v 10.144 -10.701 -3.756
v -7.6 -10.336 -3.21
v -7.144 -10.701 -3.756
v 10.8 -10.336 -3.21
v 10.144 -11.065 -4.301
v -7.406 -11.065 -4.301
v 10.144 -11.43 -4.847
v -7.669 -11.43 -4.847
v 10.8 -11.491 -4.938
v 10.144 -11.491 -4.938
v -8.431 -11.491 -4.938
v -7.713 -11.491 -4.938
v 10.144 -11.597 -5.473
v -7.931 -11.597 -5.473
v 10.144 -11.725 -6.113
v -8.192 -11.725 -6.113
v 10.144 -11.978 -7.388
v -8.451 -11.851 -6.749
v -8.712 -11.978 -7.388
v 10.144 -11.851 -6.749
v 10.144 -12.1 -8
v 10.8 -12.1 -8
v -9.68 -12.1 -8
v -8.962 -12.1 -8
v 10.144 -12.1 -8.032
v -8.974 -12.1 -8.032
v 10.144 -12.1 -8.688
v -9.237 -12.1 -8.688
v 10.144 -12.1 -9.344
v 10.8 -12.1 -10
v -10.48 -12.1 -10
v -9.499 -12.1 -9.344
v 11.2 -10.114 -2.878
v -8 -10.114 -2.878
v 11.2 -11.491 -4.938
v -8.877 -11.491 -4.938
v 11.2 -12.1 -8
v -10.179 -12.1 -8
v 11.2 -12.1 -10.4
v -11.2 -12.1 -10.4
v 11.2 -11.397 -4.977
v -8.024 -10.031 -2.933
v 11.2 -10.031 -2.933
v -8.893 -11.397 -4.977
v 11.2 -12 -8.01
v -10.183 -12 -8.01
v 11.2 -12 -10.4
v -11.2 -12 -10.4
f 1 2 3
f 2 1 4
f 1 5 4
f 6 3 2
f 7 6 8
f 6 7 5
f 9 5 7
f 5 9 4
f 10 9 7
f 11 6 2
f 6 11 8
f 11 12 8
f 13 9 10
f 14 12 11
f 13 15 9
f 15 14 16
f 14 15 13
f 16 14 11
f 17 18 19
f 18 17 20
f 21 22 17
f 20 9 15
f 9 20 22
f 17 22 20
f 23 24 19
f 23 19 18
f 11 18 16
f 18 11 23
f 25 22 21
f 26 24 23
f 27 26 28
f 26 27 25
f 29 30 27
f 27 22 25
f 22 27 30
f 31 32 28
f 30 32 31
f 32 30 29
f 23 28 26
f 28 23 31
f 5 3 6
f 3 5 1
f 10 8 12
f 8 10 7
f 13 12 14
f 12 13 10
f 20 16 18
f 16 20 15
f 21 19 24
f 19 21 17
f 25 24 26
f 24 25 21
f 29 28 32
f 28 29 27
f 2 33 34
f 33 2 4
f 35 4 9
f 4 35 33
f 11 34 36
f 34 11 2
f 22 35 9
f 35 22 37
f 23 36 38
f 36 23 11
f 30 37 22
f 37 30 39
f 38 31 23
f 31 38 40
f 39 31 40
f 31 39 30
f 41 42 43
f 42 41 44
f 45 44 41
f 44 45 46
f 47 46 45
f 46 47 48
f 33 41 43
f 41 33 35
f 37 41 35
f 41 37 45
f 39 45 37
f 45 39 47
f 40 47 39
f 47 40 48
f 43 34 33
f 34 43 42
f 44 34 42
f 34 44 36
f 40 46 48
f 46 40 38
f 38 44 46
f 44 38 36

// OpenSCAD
// file: ../p/4-4edge.scad
use <../lib.scad>
$fa=1; $fs=0.2;
function ldraw_lib__4_4edge(realsolid=false) = [
// 0 Circle 1.0
// 0 Name: 4-4edge.dat
// 0 Author: James Jessiman
// 0 !LDRAW_ORG Primitive UPDATE 2017-01
// 0 !LICENSE Licensed under CC BY 2.0 and CC BY 4.0 : see CAreadme.txt
// 
// 0 BFC CERTIFY CCW
  [0,"BFC","CERTIFY"],
  [0,"BFC","CCW"],
// 
// 0 !HISTORY 1998-12-15 [PTadmin] Official Update 1998-10
// 0 !HISTORY 2005-12-28 [PTadmin] Official Update 2005-01
// 0 !HISTORY 2007-06-24 [PTadmin] Header formatted for Contributor Agreement
// 0 !HISTORY 2008-07-01 [PTadmin] Official Update 2008-01
// 0 !HISTORY 2017-01-15 [Steffen] BFCed
// 0 !HISTORY 2017-12-30 [PTadmin] Official Update 2017-01
// 
// 
// 2 24 1 0 0 0.9239 0 0.3827
  [2,24,1,0,0,0.9239,0,0.3827],
// 2 24 0.9239 0 0.3827 0.7071 0 0.7071
  [2,24,0.9239,0,0.3827,0.7071,0,0.7071],
// 2 24 0.7071 0 0.7071 0.3827 0 0.9239
  [2,24,0.7071,0,0.7071,0.3827,0,0.9239],
// 2 24 0.3827 0 0.9239 0 0 1
  [2,24,0.3827,0,0.9239,0,0,1],
// 2 24 0 0 1 -0.3827 0 0.9239
  [2,24,0,0,1,-0.3827,0,0.9239],
// 2 24 -0.3827 0 0.9239 -0.7071 0 0.7071
  [2,24,-0.3827,0,0.9239,-0.7071,0,0.7071],
// 2 24 -0.7071 0 0.7071 -0.9239 0 0.3827
  [2,24,-0.7071,0,0.7071,-0.9239,0,0.3827],
// 2 24 -0.9239 0 0.3827 -1 0 -0
  [2,24,-0.9239,0,0.3827,-1,0,-0],
// 2 24 -1 0 -0 -0.9239 0 -0.3827
  [2,24,-1,0,-0,-0.9239,0,-0.3827],
// 2 24 -0.9239 0 -0.3827 -0.7071 0 -0.7071
  [2,24,-0.9239,0,-0.3827,-0.7071,0,-0.7071],
// 2 24 -0.7071 0 -0.7071 -0.3827 0 -0.9239
  [2,24,-0.7071,0,-0.7071,-0.3827,0,-0.9239],
// 2 24 -0.3827 0 -0.9239 0 0 -1
  [2,24,-0.3827,0,-0.9239,0,0,-1],
// 2 24 0 0 -1 0.3827 0 -0.9239
  [2,24,0,0,-1,0.3827,0,-0.9239],
// 2 24 0.3827 0 -0.9239 0.7071 0 -0.7071
  [2,24,0.3827,0,-0.9239,0.7071,0,-0.7071],
// 2 24 0.7071 0 -0.7071 0.9239 0 -0.3827
  [2,24,0.7071,0,-0.7071,0.9239,0,-0.3827],
// 2 24 0.9239 0 -0.3827 1 0 0
  [2,24,0.9239,0,-0.3827,1,0,0],
];
module ldraw_lib__4_4edge(step=0, col=false, unit=2/5, alt=false, line=0.2, solid=!$preview)
    makepoly(ldraw_lib__4_4edge(solid), step=step, col=col, unit=unit, alt=alt, line=line, solid=solid);
ldraw_lib__4_4edge(line=0.2);
// file: ../p/4-4disc.scad
use <../lib.scad>
$fa=1; $fs=0.2;
function ldraw_lib__4_4disc(realsolid=false) = [
// 0 Disc 1.0
// 0 Name: 4-4disc.dat
// 0 Author: James Jessiman
// 0 !LDRAW_ORG Primitive UPDATE 2002-02
// 0 !LICENSE Licensed under CC BY 2.0 and CC BY 4.0 : see CAreadme.txt
// 
// 0 BFC CERTIFY CCW
  [0,"BFC","CERTIFY"],
  [0,"BFC","CCW"],
// 
// 0 !HISTORY 1998-12-15 [PTadmin] Official Update 1998-10
// 0 !HISTORY 2002-03-23 [sbliss] Added BFC statement
// 0 !HISTORY 2002-04-25 [PTadmin] Official Update 2002-02
// 0 !HISTORY 2007-06-24 [PTadmin] Header formatted for Contributor Agreement
// 0 !HISTORY 2008-07-01 [PTadmin] Official Update 2008-01
// 
// 
// 3 16 0 0 0 1 0 0 0.9239 0 0.3827
  [3,16,0,0,0,1,0,0,0.9239,0,0.3827],
// 3 16 0 0 0 0.9239 0 0.3827 0.7071 0 0.7071
  [3,16,0,0,0,0.9239,0,0.3827,0.7071,0,0.7071],
// 3 16 0 0 0 0.7071 0 0.7071 0.3827 0 0.9239
  [3,16,0,0,0,0.7071,0,0.7071,0.3827,0,0.9239],
// 3 16 0 0 0 0.3827 0 0.9239 0 0 1
  [3,16,0,0,0,0.3827,0,0.9239,0,0,1],
// 3 16 0 0 0 0 0 1 -0.3827 0 0.9239
  [3,16,0,0,0,0,0,1,-0.3827,0,0.9239],
// 3 16 0 0 0 -0.3827 0 0.9239 -0.7071 0 0.7071
  [3,16,0,0,0,-0.3827,0,0.9239,-0.7071,0,0.7071],
// 3 16 0 0 0 -0.7071 0 0.7071 -0.9239 0 0.3827
  [3,16,0,0,0,-0.7071,0,0.7071,-0.9239,0,0.3827],
// 3 16 0 0 0 -0.9239 0 0.3827 -1 0 -0
  [3,16,0,0,0,-0.9239,0,0.3827,-1,0,-0],
// 3 16 0 0 0 -1 0 -0 -0.9239 0 -0.3827
  [3,16,0,0,0,-1,0,-0,-0.9239,0,-0.3827],
// 3 16 0 0 0 -0.9239 0 -0.3827 -0.7071 0 -0.7071
  [3,16,0,0,0,-0.9239,0,-0.3827,-0.7071,0,-0.7071],
// 3 16 0 0 0 -0.7071 0 -0.7071 -0.3827 0 -0.9239
  [3,16,0,0,0,-0.7071,0,-0.7071,-0.3827,0,-0.9239],
// 3 16 0 0 0 -0.3827 0 -0.9239 0 0 -1
  [3,16,0,0,0,-0.3827,0,-0.9239,0,0,-1],
// 3 16 0 0 0 0 0 -1 0.3827 0 -0.9239
  [3,16,0,0,0,0,0,-1,0.3827,0,-0.9239],
// 3 16 0 0 0 0.3827 0 -0.9239 0.7071 0 -0.7071
  [3,16,0,0,0,0.3827,0,-0.9239,0.7071,0,-0.7071],
// 3 16 0 0 0 0.7071 0 -0.7071 0.9239 0 -0.3827
  [3,16,0,0,0,0.7071,0,-0.7071,0.9239,0,-0.3827],
// 3 16 0 0 0 0.9239 0 -0.3827 1 0 0
  [3,16,0,0,0,0.9239,0,-0.3827,1,0,0],
// 0
];
module ldraw_lib__4_4disc(step=0, col=false, unit=2/5, alt=false, line=0.2, solid=!$preview)
    makepoly(ldraw_lib__4_4disc(solid), step=step, col=col, unit=unit, alt=alt, line=line, solid=solid);
ldraw_lib__4_4disc(line=0.2);
// file: ../p/4-4cyli.scad
use <../lib.scad>
$fa=1; $fs=0.2;
function ldraw_lib__4_4cyli(realsolid=false) = [
// 0 Cylinder 1.0
// 0 Name: 4-4cyli.dat
// 0 Author: James Jessiman
// 0 !LDRAW_ORG Primitive UPDATE 2005-01
// 0 !LICENSE Licensed under CC BY 2.0 and CC BY 4.0 : see CAreadme.txt
// 
// 0 BFC CERTIFY CCW
  [0,"BFC","CERTIFY"],
  [0,"BFC","CCW"],
// 
// 0 !HISTORY 1998-12-15 [PTadmin] Official Update 1998-10
// 0 !HISTORY 2002-03-23 [sbliss] Added BFC statement; merged headers from files in distributions LDraw 0.27 and Complete.
// 0 !HISTORY 2002-04-25 [PTadmin] Official Update 2002-02
// 0 !HISTORY 2004-12-14 [guyvivan] BFC CCW
// 0 !HISTORY 2005-12-28 [PTadmin] Official Update 2005-01
// 0 !HISTORY 2007-06-24 [PTadmin] Header formatted for Contributor Agreement
// 0 !HISTORY 2008-07-01 [PTadmin] Official Update 2008-01
// 
// 
// 4 16 1 1 0 0.9239 1 0.3827 0.9239 0 0.3827 1 0 0
  [4,16,1,1,0,0.9239,1,0.3827,0.9239,0,0.3827,1,0,0],
// 5 24 1 0 0 1 1 0 0.9239 0 0.3827 0.9239 0 -0.3827
  [5,24,1,0,0,1,1,0,0.9239,0,0.3827,0.9239,0,-0.3827],
// 4 16 0.9239 1 0.3827 0.7071 1 0.7071 0.7071 0 0.7071 0.9239 0 0.3827
  [4,16,0.9239,1,0.3827,0.7071,1,0.7071,0.7071,0,0.7071,0.9239,0,0.3827],
// 5 24 0.9239 0 0.3827 0.9239 1 0.3827 0.7071 0 0.7071 1 0 0
  [5,24,0.9239,0,0.3827,0.9239,1,0.3827,0.7071,0,0.7071,1,0,0],
// 4 16 0.7071 1 0.7071 0.3827 1 0.9239 0.3827 0 0.9239 0.7071 0 0.7071
  [4,16,0.7071,1,0.7071,0.3827,1,0.9239,0.3827,0,0.9239,0.7071,0,0.7071],
// 5 24 0.7071 0 0.7071 0.7071 1 0.7071 0.3827 0 0.9239 0.9239 0 0.3827
  [5,24,0.7071,0,0.7071,0.7071,1,0.7071,0.3827,0,0.9239,0.9239,0,0.3827],
// 4 16 0.3827 1 0.9239 0 1 1 0 0 1 0.3827 0 0.9239
  [4,16,0.3827,1,0.9239,0,1,1,0,0,1,0.3827,0,0.9239],
// 5 24 0.3827 0 0.9239 0.3827 1 0.9239 0 0 1 0.7071 0 0.7071
  [5,24,0.3827,0,0.9239,0.3827,1,0.9239,0,0,1,0.7071,0,0.7071],
// 4 16 0 1 1 -0.3827 1 0.9239 -0.3827 0 0.9239 0 0 1
  [4,16,0,1,1,-0.3827,1,0.9239,-0.3827,0,0.9239,0,0,1],
// 5 24 0 0 1 0 1 1 -0.3827 0 0.9239 0.3827 0 0.9239
  [5,24,0,0,1,0,1,1,-0.3827,0,0.9239,0.3827,0,0.9239],
// 4 16 -0.3827 1 0.9239 -0.7071 1 0.7071 -0.7071 0 0.7071 -0.3827 0 0.9239
  [4,16,-0.3827,1,0.9239,-0.7071,1,0.7071,-0.7071,0,0.7071,-0.3827,0,0.9239],
// 5 24 -0.3827 0 0.9239 -0.3827 1 0.9239 -0.7071 0 0.7071 0 0 1
  [5,24,-0.3827,0,0.9239,-0.3827,1,0.9239,-0.7071,0,0.7071,0,0,1],
// 4 16 -0.7071 1 0.7071 -0.9239 1 0.3827 -0.9239 0 0.3827 -0.7071 0 0.7071
  [4,16,-0.7071,1,0.7071,-0.9239,1,0.3827,-0.9239,0,0.3827,-0.7071,0,0.7071],
// 5 24 -0.7071 0 0.7071 -0.7071 1 0.7071 -0.9239 0 0.3827 -0.3827 0 0.9239
  [5,24,-0.7071,0,0.7071,-0.7071,1,0.7071,-0.9239,0,0.3827,-0.3827,0,0.9239],
// 4 16 -0.9239 1 0.3827 -1 1 0 -1 0 0 -0.9239 0 0.3827
  [4,16,-0.9239,1,0.3827,-1,1,0,-1,0,0,-0.9239,0,0.3827],
// 5 24 -0.9239 0 0.3827 -0.9239 1 0.3827 -1 0 0 -0.7071 0 0.7071
  [5,24,-0.9239,0,0.3827,-0.9239,1,0.3827,-1,0,0,-0.7071,0,0.7071],
// 4 16 -1 1 0 -0.9239 1 -0.3827 -0.9239 0 -0.3827 -1 0 0
  [4,16,-1,1,0,-0.9239,1,-0.3827,-0.9239,0,-0.3827,-1,0,0],
// 5 24 -1 0 0 -1 1 0 -0.9239 0 -0.3827 -0.9239 0 0.3827
  [5,24,-1,0,0,-1,1,0,-0.9239,0,-0.3827,-0.9239,0,0.3827],
// 4 16 -0.9239 1 -0.3827 -0.7071 1 -0.7071 -0.7071 0 -0.7071 -0.9239 0 -0.3827
  [4,16,-0.9239,1,-0.3827,-0.7071,1,-0.7071,-0.7071,0,-0.7071,-0.9239,0,-0.3827],
// 5 24 -0.9239 0 -0.3827 -0.9239 1 -0.3827 -0.7071 0 -0.7071 -1 0 0
  [5,24,-0.9239,0,-0.3827,-0.9239,1,-0.3827,-0.7071,0,-0.7071,-1,0,0],
// 4 16 -0.7071 1 -0.7071 -0.3827 1 -0.9239 -0.3827 0 -0.9239 -0.7071 0 -0.7071
  [4,16,-0.7071,1,-0.7071,-0.3827,1,-0.9239,-0.3827,0,-0.9239,-0.7071,0,-0.7071],
// 5 24 -0.7071 0 -0.7071 -0.7071 1 -0.7071 -0.3827 0 -0.9239 -0.9239 0 -0.3827
  [5,24,-0.7071,0,-0.7071,-0.7071,1,-0.7071,-0.3827,0,-0.9239,-0.9239,0,-0.3827],
// 4 16 -0.3827 1 -0.9239 0 1 -1 0 0 -1 -0.3827 0 -0.9239
  [4,16,-0.3827,1,-0.9239,0,1,-1,0,0,-1,-0.3827,0,-0.9239],
// 5 24 -0.3827 0 -0.9239 -0.3827 1 -0.9239 0 0 -1 -0.7071 0 -0.7071
  [5,24,-0.3827,0,-0.9239,-0.3827,1,-0.9239,0,0,-1,-0.7071,0,-0.7071],
// 4 16 0 1 -1 0.3827 1 -0.9239 0.3827 0 -0.9239 0 0 -1
  [4,16,0,1,-1,0.3827,1,-0.9239,0.3827,0,-0.9239,0,0,-1],
// 5 24 0 0 -1 0 1 -1 0.3827 0 -0.9239 -0.3827 0 -0.9239
  [5,24,0,0,-1,0,1,-1,0.3827,0,-0.9239,-0.3827,0,-0.9239],
// 4 16 0.3827 1 -0.9239 0.7071 1 -0.7071 0.7071 0 -0.7071 0.3827 0 -0.9239
  [4,16,0.3827,1,-0.9239,0.7071,1,-0.7071,0.7071,0,-0.7071,0.3827,0,-0.9239],
// 5 24 0.3827 0 -0.9239 0.3827 1 -0.9239 0.7071 0 -0.7071 0 0 -1
  [5,24,0.3827,0,-0.9239,0.3827,1,-0.9239,0.7071,0,-0.7071,0,0,-1],
// 4 16 0.7071 1 -0.7071 0.9239 1 -0.3827 0.9239 0 -0.3827 0.7071 0 -0.7071
  [4,16,0.7071,1,-0.7071,0.9239,1,-0.3827,0.9239,0,-0.3827,0.7071,0,-0.7071],
// 5 24 0.7071 0 -0.7071 0.7071 1 -0.7071 0.9239 0 -0.3827 0.3827 0 -0.9239
  [5,24,0.7071,0,-0.7071,0.7071,1,-0.7071,0.9239,0,-0.3827,0.3827,0,-0.9239],
// 4 16 0.9239 1 -0.3827 1 1 0 1 0 0 0.9239 0 -0.3827
  [4,16,0.9239,1,-0.3827,1,1,0,1,0,0,0.9239,0,-0.3827],
// 5 24 0.9239 0 -0.3827 0.9239 1 -0.3827 1 0 0 0.7071 0 -0.7071
  [5,24,0.9239,0,-0.3827,0.9239,1,-0.3827,1,0,0,0.7071,0,-0.7071],
// 0
];
module ldraw_lib__4_4cyli(step=0, col=false, unit=2/5, alt=false, line=0.2, solid=!$preview)
    makepoly(ldraw_lib__4_4cyli(solid), step=step, col=col, unit=unit, alt=alt, line=line, solid=solid);
ldraw_lib__4_4cyli(line=0.2);
// file: ../p/stud3.scad
use <../lib.scad>
use <4-4cyli.scad>
use <4-4disc.scad>
use <4-4edge.scad>
$fa=1; $fs=0.2;
function ldraw_lib__stud3(realsolid=false) = realsolid ? 
    [openscad(translate([0,0,-eps()], o=cylinder(4+eps(), r=4)),2)] : [
// 0 Stud Tube Solid
// 0 Name: stud3.dat
// 0 Author: James Jessiman
// 0 !LDRAW_ORG Primitive UPDATE 2012-01
// 0 !LICENSE Licensed under CC BY 2.0 and CC BY 4.0 : see CAreadme.txt
// 
// 0 BFC CERTIFY CCW
  [0,"BFC","CERTIFY"],
  [0,"BFC","CCW"],
// 
// 0 !HISTORY 2002-04-04 [sbliss] Modified for BFC compliance
// 0 !HISTORY 2002-04-25 [PTadmin] Official Update 2002-02
// 0 !HISTORY 2007-06-24 [PTadmin] Header formatted for Contributor Agreement
// 0 !HISTORY 2008-07-01 [PTadmin] Official Update 2008-01
// 0 !HISTORY 2012-02-16 [Philo] Changed to CCW
// 0 !HISTORY 2012-03-30 [PTadmin] Official Update 2012-01
// 
// 
// 1 16 0 -4 0 4 0 0 0 1 0 0 0 4 4-4edge.dat
  [1,16,0,-4,0,4,0,0,0,1,0,0,0,4, ldraw_lib__4_4edge(realsolid)],
// 1 16 0 0 0 4 0 0 0 1 0 0 0 4 4-4edge.dat
  [1,16,0,0,0,4,0,0,0,1,0,0,0,4, ldraw_lib__4_4edge(realsolid)],
// 1 16 0 -4 0 4 0 0 0 1 0 0 0 4 4-4disc.dat
  [1,16,0,-4,0,4,0,0,0,1,0,0,0,4, ldraw_lib__4_4disc(realsolid)],
// 1 16 0 -4 0 4 0 0 0 4 0 0 0 4 4-4cyli.dat
  [1,16,0,-4,0,4,0,0,0,4,0,0,0,4, ldraw_lib__4_4cyli(realsolid)],
];
module ldraw_lib__stud3(step=0, col=false, unit=2/5, alt=false, line=0.2, solid=!$preview)
    makepoly(ldraw_lib__stud3(solid), step=step, col=col, unit=unit, alt=alt, line=line, solid=solid);
ldraw_lib__stud3(line=0.2);
// file: ../p/stud.scad
use <../lib.scad>
use <4-4cyli.scad>
use <4-4disc.scad>
use <4-4edge.scad>
$fa=1; $fs=0.2;
function ldraw_lib__stud(realsolid=false) = realsolid ? 
    [openscad(translate([0,0,-eps()], o=cylinder(4+eps(), r=6)),2)] : [
// 0 Stud
// 0 Name: stud.dat
// 0 Author: James Jessiman
// 0 !LDRAW_ORG Primitive UPDATE 2012-01
// 0 !LICENSE Licensed under CC BY 2.0 and CC BY 4.0 : see CAreadme.txt
// 
// 0 BFC CERTIFY CCW
  [0,"BFC","CERTIFY"],
  [0,"BFC","CCW"],
// 
// 0 !HISTORY 2002-04-04 [sbliss] Modified for BFC compliance
// 0 !HISTORY 2002-04-25 [PTadmin] Official Update 2002-02
// 0 !HISTORY 2007-06-24 [PTadmin] Header formatted for Contributor Agreement
// 0 !HISTORY 2008-07-01 [PTadmin] Official Update 2008-01
// 0 !HISTORY 2012-02-16 [Philo] Changed to CCW
// 0 !HISTORY 2012-03-30 [PTadmin] Official Update 2012-01
// 
// 
// 1 16 0 0 0 6 0 0 0 1 0 0 0 6 4-4edge.dat
  [1,16,0,0,0,6,0,0,0,1,0,0,0,6, ldraw_lib__4_4edge(realsolid)],
// 1 16 0 -4 0 6 0 0 0 1 0 0 0 6 4-4edge.dat
  [1,16,0,-4,0,6,0,0,0,1,0,0,0,6, ldraw_lib__4_4edge(realsolid)],
// 1 16 0 0 0 6 0 0 0 -4 0 0 0 6 4-4cyli.dat
  [1,16,0,0,0,6,0,0,0,-4,0,0,0,6, ldraw_lib__4_4cyli(realsolid)],
// 1 16 0 -4 0 6 0 0 0 1 0 0 0 6 4-4disc.dat
  [1,16,0,-4,0,6,0,0,0,1,0,0,0,6, ldraw_lib__4_4disc(realsolid)],
];
module ldraw_lib__stud(step=0, col=false, unit=2/5, alt=false, line=0.2, solid=!$preview)
    makepoly(ldraw_lib__stud(solid), step=step, col=col, unit=unit, alt=alt, line=line, solid=solid);
ldraw_lib__stud(line=0.2);
// file: ../p/box5.scad
use <../lib.scad>
$fa=1; $fs=0.2;
function ldraw_lib__box5(realsolid=false) = [
// 0 Box with 5 Faces and All Edges
// 0 Name: box5.dat
// 0 Author: James Jessiman
// 0 !LDRAW_ORG Primitive UPDATE 2012-01
// 0 !LICENSE Licensed under CC BY 2.0 and CC BY 4.0 : see CAreadme.txt
// 
// 0 BFC CERTIFY CCW
  [0,"BFC","CERTIFY"],
  [0,"BFC","CCW"],
// 
// 0 !HISTORY 2002-04-03 [sbliss] Modified for BFC compliance
// 0 !HISTORY 2002-04-25 [PTadmin] Official Update 2002-02
// 0 !HISTORY 2007-06-24 [PTadmin] Header formatted for Contributor Agreement
// 0 !HISTORY 2008-07-01 [PTadmin] Official Update 2008-01
// 0 !HISTORY 2012-02-16 [Philo] Changed to CCW
// 0 !HISTORY 2012-03-30 [PTadmin] Official Update 2012-01
// 
// 
// 2 24 1 1 1 -1 1 1
  [2,24,1,1,1,-1,1,1],
// 2 24 -1 1 1 -1 1 -1
  [2,24,-1,1,1,-1,1,-1],
// 2 24 -1 1 -1 1 1 -1
  [2,24,-1,1,-1,1,1,-1],
// 2 24 1 1 -1 1 1 1
  [2,24,1,1,-1,1,1,1],
// 2 24 1 0 1 -1 0 1
  [2,24,1,0,1,-1,0,1],
// 2 24 -1 0 1 -1 0 -1
  [2,24,-1,0,1,-1,0,-1],
// 2 24 -1 0 -1 1 0 -1
  [2,24,-1,0,-1,1,0,-1],
// 2 24 1 0 -1 1 0 1
  [2,24,1,0,-1,1,0,1],
// 2 24 1 0 1 1 1 1
  [2,24,1,0,1,1,1,1],
// 2 24 -1 0 1 -1 1 1
  [2,24,-1,0,1,-1,1,1],
// 2 24 1 0 -1 1 1 -1
  [2,24,1,0,-1,1,1,-1],
// 2 24 -1 0 -1 -1 1 -1
  [2,24,-1,0,-1,-1,1,-1],
// 4 16 -1 1 1 1 1 1 1 1 -1 -1 1 -1
  [4,16,-1,1,1,1,1,1,1,1,-1,-1,1,-1],
// 4 16 -1 1 1 -1 0 1 1 0 1 1 1 1
  [4,16,-1,1,1,-1,0,1,1,0,1,1,1,1],
// 4 16 -1 1 -1 -1 0 -1 -1 0 1 -1 1 1
  [4,16,-1,1,-1,-1,0,-1,-1,0,1,-1,1,1],
// 4 16 1 1 -1 1 0 -1 -1 0 -1 -1 1 -1
  [4,16,1,1,-1,1,0,-1,-1,0,-1,-1,1,-1],
// 4 16 1 1 1 1 0 1 1 0 -1 1 1 -1
  [4,16,1,1,1,1,0,1,1,0,-1,1,1,-1],
];
module ldraw_lib__box5(step=0, col=false, unit=2/5, alt=false, line=0.2, solid=!$preview)
    makepoly(ldraw_lib__box5(solid), step=step, col=col, unit=unit, alt=alt, line=line, solid=solid);
ldraw_lib__box5(line=0.2);
// file: ../p/box4t.scad
use <../lib.scad>
$fa=1; $fs=0.2;
function ldraw_lib__box4t(realsolid=false) = [
// 0 Box with 4 Adjacent Faces and All Edges
// 0 Name: box4t.dat
// 0 Author: Tore Eriksson [Tore_Eriksson]
// 0 !LDRAW_ORG Primitive UPDATE 2003-02
// 0 !LICENSE Licensed under CC BY 2.0 and CC BY 4.0 : see CAreadme.txt
// 
// 0 BFC CERTIFY CCW
  [0,"BFC","CERTIFY"],
  [0,"BFC","CCW"],
// 
// 0 !HISTORY 1997-09-29 [PTadmin] Official Update 1997-15
// 0 !HISTORY 2002-08-31 [izanette] Modified with WINDZ for BFC compliance
// 0 !HISTORY 2003-08-01 [PTadmin] Official Update 2003-02
// 0 !HISTORY 2007-06-24 [PTadmin] Header formatted for Contributor Agreement
// 0 !HISTORY 2008-07-01 [PTadmin] Official Update 2008-01
// 
// 
// 2 24 1 1 1 -1 1 1
  [2,24,1,1,1,-1,1,1],
// 2 24 -1 1 1 -1 1 -1
  [2,24,-1,1,1,-1,1,-1],
// 2 24 -1 1 -1 1 1 -1
  [2,24,-1,1,-1,1,1,-1],
// 2 24 1 1 -1 1 1 1
  [2,24,1,1,-1,1,1,1],
// 2 24 1 0 1 -1 0 1
  [2,24,1,0,1,-1,0,1],
// 2 24 -1 0 1 -1 0 -1
  [2,24,-1,0,1,-1,0,-1],
// 2 24 -1 0 -1 1 0 -1
  [2,24,-1,0,-1,1,0,-1],
// 2 24 1 0 -1 1 0 1
  [2,24,1,0,-1,1,0,1],
// 2 24 1 0 1 1 1 1
  [2,24,1,0,1,1,1,1],
// 2 24 -1 0 1 -1 1 1
  [2,24,-1,0,1,-1,1,1],
// 2 24 1 0 -1 1 1 -1
  [2,24,1,0,-1,1,1,-1],
// 2 24 -1 0 -1 -1 1 -1
  [2,24,-1,0,-1,-1,1,-1],
// 4 16 1 1 1 1 1 -1 -1 1 -1 -1 1 1
  [4,16,1,1,1,1,1,-1,-1,1,-1,-1,1,1],
// 4 16 1 1 1 -1 1 1 -1 0 1 1 0 1
  [4,16,1,1,1,-1,1,1,-1,0,1,1,0,1],
// 4 16 -1 1 1 -1 1 -1 -1 0 -1 -1 0 1
  [4,16,-1,1,1,-1,1,-1,-1,0,-1,-1,0,1],
// 0 4 16 -1 1 -1 -1 0 -1 1 0 -1 1 1 -1
// 4 16 1 1 -1 1 1 1 1 0 1 1 0 -1
  [4,16,1,1,-1,1,1,1,1,0,1,1,0,-1],
// 0
];
module ldraw_lib__box4t(step=0, col=false, unit=2/5, alt=false, line=0.2, solid=!$preview)
    makepoly(ldraw_lib__box4t(solid), step=step, col=col, unit=unit, alt=alt, line=line, solid=solid);
ldraw_lib__box4t(line=0.2);
// file: s/3004s01.scad
use <../../lib.scad>
use <../../p/box4t.scad>
use <../../p/box5.scad>
use <../../p/stud.scad>
use <../../p/stud3.scad>
$fa=1; $fs=0.2;
function ldraw_lib__s__3004s01(realsolid=false) = [
// 0 ~Brick  1 x  2 without Front Face
// 0 Name: s\3004s01.dat
// 0 Author: James Jessiman
// 0 !LDRAW_ORG Subpart UPDATE 2003-03
// 0 !LICENSE Licensed under CC BY 2.0 and CC BY 4.0 : see CAreadme.txt
// 
// 0 BFC CERTIFY CCW
  [0,"BFC","CERTIFY"],
  [0,"BFC","CCW"],
// 
// 0 !HISTORY 2003-09-07 [jriley] Subfiling, BFC
// 0 !HISTORY 2003-12-19 [PTadmin] Official Update 2003-03
// 0 !HISTORY 2007-08-29 [PTadmin] Header formatted for Contributor Agreement
// 0 !HISTORY 2008-07-01 [PTadmin] Official Update 2008-01
// 
// 
// 1 16 0 4 0 1 0 0 0 -5 0 0 0 1 stud3.dat
  [1,16,0,4,0,1,0,0,0,-5,0,0,0,1, ldraw_lib__stud3(realsolid)],
// 0 BFC INVERTNEXT
  [0,"BFC","INVERTNEXT"],
// 1 16 0 24 0 16 0 0 0 -20 0 0 0 6 box5.dat
  [1,16,0,24,0,16,0,0,0,-20,0,0,0,6, ldraw_lib__box5(realsolid)],
// 4 16 20 24 10 16 24 6 -16 24 6 -20 24 10
  [4,16,20,24,10,16,24,6,-16,24,6,-20,24,10],
// 4 16 -20 24 10 -16 24 6 -16 24 -6 -20 24 -10
  [4,16,-20,24,10,-16,24,6,-16,24,-6,-20,24,-10],
// 4 16 -20 24 -10 -16 24 -6 16 24 -6 20 24 -10
  [4,16,-20,24,-10,-16,24,-6,16,24,-6,20,24,-10],
// 4 16 20 24 -10 16 24 -6 16 24 6 20 24 10
  [4,16,20,24,-10,16,24,-6,16,24,6,20,24,10],
// 1 16 0 24 0 20 0 0 0 -24 0 0 0 10 box4t.dat
  [1,16,0,24,0,20,0,0,0,-24,0,0,0,10, ldraw_lib__box4t(realsolid)],
// 1 16 10 0 0 1 0 0 0 1 0 0 0 1 stud.dat
  [1,16,10,0,0,1,0,0,0,1,0,0,0,1, ldraw_lib__stud(realsolid)],
// 1 16 -10 0 0 1 0 0 0 1 0 0 0 1 stud.dat
  [1,16,-10,0,0,1,0,0,0,1,0,0,0,1, ldraw_lib__stud(realsolid)],
// 0
];
module ldraw_lib__s__3004s01(step=0, col=false, unit=2/5, alt=false, line=0.2, solid=!$preview)
    makepoly(ldraw_lib__s__3004s01(solid), step=step, col=col, unit=unit, alt=alt, line=line, solid=solid);
ldraw_lib__s__3004s01(line=0.2);
// file: 3004.scad
use <../lib.scad>
use <s/3004s01.scad>
$fa=1; $fs=0.2;
function ldraw_lib__3004(realsolid=false) = [
// 0 Brick  1 x  2
// 0 Name: 3004.dat
// 0 Author: James Jessiman
// 0 !LDRAW_ORG Part UPDATE 2022-05
// 0 !LICENSE Licensed under CC BY 2.0 and CC BY 4.0 : see CAreadme.txt
// 
// 0 BFC CERTIFY CCW
  [0,"BFC","CERTIFY"],
  [0,"BFC","CCW"],
// 
// 0 !HISTORY 2001-10-26 [PTadmin] Official Update 2001-01
// 0 !HISTORY 2002-05-07 {unknown} BFC Certification
// 0 !HISTORY 2002-06-11 [PTadmin] Official Update 2002-03
// 0 !HISTORY 2007-05-07 [PTadmin] Header formatted for Contributor Agreement
// 0 !HISTORY 2008-07-01 [PTadmin] Official Update 2008-01
// 0 !HISTORY 2022-08-04 [MagFors] Using subfile
// 0 !HISTORY 2022-09-15 [PTadmin] Official Update 2022-05
// 
// 
// 1 16 0 0 0 1 0 0 0 1 0 0 0 1 s\3004s01.dat
  [1,16,0,0,0,1,0,0,0,1,0,0,0,1, ldraw_lib__s__3004s01(realsolid)],
// 4 16 -20 24 -10 20 24 -10 20 0 -10 -20 0 -10
  [4,16,-20,24,-10,20,24,-10,20,0,-10,-20,0,-10],
];
module ldraw_lib__3004(step=0, col=false, unit=2/5, alt=false, line=0.2, solid=!$preview)
    makepoly(ldraw_lib__3004(solid), step=step, col=col, unit=unit, alt=alt, line=line, solid=solid);
ldraw_lib__3004(line=0.2);
// main file
use <../lib.scad>
use <821472hc01.scad>
$fa=1; $fs=0.2;
function ldraw_lib__821472ic01(realsolid=false) = [
// 0 Sticker  1.0 x  2.8 with Black and Light Grey Grid on Transparent Background (Left) (Formed)
// 0 Name: 821472ic01.dat
// 0 Author: Damien Roux [Darats]
// 0 !LDRAW_ORG Part UPDATE 2016-01
// 0 !LICENSE Licensed under CC BY 2.0 and CC BY 4.0 : see CAreadme.txt
// 
// 0 BFC CERTIFY CCW
  [0,"BFC","CERTIFY"],
  [0,"BFC","CCW"],
// 
// 0 !KEYWORDS Set 5521
// 
// 0 !HISTORY 2016-12-31 [PTadmin] Official Update 2016-01
// 
// 
// 1 16 0 0 0 -1 0 0 0 1 0 0 0 1 821472hc01.dat
  [1,16,0,0,0,-1,0,0,0,1,0,0,0,1, ldraw_lib__821472hc01(realsolid)],
];
module ldraw_lib__821472ic01(step=0, col=false, unit=2/5, alt=false, line=0.2, solid=!$preview)
    makepoly(ldraw_lib__821472ic01(solid), step=step, col=col, unit=unit, alt=alt, line=line, solid=solid);
ldraw_lib__821472ic01(line=0.2);
